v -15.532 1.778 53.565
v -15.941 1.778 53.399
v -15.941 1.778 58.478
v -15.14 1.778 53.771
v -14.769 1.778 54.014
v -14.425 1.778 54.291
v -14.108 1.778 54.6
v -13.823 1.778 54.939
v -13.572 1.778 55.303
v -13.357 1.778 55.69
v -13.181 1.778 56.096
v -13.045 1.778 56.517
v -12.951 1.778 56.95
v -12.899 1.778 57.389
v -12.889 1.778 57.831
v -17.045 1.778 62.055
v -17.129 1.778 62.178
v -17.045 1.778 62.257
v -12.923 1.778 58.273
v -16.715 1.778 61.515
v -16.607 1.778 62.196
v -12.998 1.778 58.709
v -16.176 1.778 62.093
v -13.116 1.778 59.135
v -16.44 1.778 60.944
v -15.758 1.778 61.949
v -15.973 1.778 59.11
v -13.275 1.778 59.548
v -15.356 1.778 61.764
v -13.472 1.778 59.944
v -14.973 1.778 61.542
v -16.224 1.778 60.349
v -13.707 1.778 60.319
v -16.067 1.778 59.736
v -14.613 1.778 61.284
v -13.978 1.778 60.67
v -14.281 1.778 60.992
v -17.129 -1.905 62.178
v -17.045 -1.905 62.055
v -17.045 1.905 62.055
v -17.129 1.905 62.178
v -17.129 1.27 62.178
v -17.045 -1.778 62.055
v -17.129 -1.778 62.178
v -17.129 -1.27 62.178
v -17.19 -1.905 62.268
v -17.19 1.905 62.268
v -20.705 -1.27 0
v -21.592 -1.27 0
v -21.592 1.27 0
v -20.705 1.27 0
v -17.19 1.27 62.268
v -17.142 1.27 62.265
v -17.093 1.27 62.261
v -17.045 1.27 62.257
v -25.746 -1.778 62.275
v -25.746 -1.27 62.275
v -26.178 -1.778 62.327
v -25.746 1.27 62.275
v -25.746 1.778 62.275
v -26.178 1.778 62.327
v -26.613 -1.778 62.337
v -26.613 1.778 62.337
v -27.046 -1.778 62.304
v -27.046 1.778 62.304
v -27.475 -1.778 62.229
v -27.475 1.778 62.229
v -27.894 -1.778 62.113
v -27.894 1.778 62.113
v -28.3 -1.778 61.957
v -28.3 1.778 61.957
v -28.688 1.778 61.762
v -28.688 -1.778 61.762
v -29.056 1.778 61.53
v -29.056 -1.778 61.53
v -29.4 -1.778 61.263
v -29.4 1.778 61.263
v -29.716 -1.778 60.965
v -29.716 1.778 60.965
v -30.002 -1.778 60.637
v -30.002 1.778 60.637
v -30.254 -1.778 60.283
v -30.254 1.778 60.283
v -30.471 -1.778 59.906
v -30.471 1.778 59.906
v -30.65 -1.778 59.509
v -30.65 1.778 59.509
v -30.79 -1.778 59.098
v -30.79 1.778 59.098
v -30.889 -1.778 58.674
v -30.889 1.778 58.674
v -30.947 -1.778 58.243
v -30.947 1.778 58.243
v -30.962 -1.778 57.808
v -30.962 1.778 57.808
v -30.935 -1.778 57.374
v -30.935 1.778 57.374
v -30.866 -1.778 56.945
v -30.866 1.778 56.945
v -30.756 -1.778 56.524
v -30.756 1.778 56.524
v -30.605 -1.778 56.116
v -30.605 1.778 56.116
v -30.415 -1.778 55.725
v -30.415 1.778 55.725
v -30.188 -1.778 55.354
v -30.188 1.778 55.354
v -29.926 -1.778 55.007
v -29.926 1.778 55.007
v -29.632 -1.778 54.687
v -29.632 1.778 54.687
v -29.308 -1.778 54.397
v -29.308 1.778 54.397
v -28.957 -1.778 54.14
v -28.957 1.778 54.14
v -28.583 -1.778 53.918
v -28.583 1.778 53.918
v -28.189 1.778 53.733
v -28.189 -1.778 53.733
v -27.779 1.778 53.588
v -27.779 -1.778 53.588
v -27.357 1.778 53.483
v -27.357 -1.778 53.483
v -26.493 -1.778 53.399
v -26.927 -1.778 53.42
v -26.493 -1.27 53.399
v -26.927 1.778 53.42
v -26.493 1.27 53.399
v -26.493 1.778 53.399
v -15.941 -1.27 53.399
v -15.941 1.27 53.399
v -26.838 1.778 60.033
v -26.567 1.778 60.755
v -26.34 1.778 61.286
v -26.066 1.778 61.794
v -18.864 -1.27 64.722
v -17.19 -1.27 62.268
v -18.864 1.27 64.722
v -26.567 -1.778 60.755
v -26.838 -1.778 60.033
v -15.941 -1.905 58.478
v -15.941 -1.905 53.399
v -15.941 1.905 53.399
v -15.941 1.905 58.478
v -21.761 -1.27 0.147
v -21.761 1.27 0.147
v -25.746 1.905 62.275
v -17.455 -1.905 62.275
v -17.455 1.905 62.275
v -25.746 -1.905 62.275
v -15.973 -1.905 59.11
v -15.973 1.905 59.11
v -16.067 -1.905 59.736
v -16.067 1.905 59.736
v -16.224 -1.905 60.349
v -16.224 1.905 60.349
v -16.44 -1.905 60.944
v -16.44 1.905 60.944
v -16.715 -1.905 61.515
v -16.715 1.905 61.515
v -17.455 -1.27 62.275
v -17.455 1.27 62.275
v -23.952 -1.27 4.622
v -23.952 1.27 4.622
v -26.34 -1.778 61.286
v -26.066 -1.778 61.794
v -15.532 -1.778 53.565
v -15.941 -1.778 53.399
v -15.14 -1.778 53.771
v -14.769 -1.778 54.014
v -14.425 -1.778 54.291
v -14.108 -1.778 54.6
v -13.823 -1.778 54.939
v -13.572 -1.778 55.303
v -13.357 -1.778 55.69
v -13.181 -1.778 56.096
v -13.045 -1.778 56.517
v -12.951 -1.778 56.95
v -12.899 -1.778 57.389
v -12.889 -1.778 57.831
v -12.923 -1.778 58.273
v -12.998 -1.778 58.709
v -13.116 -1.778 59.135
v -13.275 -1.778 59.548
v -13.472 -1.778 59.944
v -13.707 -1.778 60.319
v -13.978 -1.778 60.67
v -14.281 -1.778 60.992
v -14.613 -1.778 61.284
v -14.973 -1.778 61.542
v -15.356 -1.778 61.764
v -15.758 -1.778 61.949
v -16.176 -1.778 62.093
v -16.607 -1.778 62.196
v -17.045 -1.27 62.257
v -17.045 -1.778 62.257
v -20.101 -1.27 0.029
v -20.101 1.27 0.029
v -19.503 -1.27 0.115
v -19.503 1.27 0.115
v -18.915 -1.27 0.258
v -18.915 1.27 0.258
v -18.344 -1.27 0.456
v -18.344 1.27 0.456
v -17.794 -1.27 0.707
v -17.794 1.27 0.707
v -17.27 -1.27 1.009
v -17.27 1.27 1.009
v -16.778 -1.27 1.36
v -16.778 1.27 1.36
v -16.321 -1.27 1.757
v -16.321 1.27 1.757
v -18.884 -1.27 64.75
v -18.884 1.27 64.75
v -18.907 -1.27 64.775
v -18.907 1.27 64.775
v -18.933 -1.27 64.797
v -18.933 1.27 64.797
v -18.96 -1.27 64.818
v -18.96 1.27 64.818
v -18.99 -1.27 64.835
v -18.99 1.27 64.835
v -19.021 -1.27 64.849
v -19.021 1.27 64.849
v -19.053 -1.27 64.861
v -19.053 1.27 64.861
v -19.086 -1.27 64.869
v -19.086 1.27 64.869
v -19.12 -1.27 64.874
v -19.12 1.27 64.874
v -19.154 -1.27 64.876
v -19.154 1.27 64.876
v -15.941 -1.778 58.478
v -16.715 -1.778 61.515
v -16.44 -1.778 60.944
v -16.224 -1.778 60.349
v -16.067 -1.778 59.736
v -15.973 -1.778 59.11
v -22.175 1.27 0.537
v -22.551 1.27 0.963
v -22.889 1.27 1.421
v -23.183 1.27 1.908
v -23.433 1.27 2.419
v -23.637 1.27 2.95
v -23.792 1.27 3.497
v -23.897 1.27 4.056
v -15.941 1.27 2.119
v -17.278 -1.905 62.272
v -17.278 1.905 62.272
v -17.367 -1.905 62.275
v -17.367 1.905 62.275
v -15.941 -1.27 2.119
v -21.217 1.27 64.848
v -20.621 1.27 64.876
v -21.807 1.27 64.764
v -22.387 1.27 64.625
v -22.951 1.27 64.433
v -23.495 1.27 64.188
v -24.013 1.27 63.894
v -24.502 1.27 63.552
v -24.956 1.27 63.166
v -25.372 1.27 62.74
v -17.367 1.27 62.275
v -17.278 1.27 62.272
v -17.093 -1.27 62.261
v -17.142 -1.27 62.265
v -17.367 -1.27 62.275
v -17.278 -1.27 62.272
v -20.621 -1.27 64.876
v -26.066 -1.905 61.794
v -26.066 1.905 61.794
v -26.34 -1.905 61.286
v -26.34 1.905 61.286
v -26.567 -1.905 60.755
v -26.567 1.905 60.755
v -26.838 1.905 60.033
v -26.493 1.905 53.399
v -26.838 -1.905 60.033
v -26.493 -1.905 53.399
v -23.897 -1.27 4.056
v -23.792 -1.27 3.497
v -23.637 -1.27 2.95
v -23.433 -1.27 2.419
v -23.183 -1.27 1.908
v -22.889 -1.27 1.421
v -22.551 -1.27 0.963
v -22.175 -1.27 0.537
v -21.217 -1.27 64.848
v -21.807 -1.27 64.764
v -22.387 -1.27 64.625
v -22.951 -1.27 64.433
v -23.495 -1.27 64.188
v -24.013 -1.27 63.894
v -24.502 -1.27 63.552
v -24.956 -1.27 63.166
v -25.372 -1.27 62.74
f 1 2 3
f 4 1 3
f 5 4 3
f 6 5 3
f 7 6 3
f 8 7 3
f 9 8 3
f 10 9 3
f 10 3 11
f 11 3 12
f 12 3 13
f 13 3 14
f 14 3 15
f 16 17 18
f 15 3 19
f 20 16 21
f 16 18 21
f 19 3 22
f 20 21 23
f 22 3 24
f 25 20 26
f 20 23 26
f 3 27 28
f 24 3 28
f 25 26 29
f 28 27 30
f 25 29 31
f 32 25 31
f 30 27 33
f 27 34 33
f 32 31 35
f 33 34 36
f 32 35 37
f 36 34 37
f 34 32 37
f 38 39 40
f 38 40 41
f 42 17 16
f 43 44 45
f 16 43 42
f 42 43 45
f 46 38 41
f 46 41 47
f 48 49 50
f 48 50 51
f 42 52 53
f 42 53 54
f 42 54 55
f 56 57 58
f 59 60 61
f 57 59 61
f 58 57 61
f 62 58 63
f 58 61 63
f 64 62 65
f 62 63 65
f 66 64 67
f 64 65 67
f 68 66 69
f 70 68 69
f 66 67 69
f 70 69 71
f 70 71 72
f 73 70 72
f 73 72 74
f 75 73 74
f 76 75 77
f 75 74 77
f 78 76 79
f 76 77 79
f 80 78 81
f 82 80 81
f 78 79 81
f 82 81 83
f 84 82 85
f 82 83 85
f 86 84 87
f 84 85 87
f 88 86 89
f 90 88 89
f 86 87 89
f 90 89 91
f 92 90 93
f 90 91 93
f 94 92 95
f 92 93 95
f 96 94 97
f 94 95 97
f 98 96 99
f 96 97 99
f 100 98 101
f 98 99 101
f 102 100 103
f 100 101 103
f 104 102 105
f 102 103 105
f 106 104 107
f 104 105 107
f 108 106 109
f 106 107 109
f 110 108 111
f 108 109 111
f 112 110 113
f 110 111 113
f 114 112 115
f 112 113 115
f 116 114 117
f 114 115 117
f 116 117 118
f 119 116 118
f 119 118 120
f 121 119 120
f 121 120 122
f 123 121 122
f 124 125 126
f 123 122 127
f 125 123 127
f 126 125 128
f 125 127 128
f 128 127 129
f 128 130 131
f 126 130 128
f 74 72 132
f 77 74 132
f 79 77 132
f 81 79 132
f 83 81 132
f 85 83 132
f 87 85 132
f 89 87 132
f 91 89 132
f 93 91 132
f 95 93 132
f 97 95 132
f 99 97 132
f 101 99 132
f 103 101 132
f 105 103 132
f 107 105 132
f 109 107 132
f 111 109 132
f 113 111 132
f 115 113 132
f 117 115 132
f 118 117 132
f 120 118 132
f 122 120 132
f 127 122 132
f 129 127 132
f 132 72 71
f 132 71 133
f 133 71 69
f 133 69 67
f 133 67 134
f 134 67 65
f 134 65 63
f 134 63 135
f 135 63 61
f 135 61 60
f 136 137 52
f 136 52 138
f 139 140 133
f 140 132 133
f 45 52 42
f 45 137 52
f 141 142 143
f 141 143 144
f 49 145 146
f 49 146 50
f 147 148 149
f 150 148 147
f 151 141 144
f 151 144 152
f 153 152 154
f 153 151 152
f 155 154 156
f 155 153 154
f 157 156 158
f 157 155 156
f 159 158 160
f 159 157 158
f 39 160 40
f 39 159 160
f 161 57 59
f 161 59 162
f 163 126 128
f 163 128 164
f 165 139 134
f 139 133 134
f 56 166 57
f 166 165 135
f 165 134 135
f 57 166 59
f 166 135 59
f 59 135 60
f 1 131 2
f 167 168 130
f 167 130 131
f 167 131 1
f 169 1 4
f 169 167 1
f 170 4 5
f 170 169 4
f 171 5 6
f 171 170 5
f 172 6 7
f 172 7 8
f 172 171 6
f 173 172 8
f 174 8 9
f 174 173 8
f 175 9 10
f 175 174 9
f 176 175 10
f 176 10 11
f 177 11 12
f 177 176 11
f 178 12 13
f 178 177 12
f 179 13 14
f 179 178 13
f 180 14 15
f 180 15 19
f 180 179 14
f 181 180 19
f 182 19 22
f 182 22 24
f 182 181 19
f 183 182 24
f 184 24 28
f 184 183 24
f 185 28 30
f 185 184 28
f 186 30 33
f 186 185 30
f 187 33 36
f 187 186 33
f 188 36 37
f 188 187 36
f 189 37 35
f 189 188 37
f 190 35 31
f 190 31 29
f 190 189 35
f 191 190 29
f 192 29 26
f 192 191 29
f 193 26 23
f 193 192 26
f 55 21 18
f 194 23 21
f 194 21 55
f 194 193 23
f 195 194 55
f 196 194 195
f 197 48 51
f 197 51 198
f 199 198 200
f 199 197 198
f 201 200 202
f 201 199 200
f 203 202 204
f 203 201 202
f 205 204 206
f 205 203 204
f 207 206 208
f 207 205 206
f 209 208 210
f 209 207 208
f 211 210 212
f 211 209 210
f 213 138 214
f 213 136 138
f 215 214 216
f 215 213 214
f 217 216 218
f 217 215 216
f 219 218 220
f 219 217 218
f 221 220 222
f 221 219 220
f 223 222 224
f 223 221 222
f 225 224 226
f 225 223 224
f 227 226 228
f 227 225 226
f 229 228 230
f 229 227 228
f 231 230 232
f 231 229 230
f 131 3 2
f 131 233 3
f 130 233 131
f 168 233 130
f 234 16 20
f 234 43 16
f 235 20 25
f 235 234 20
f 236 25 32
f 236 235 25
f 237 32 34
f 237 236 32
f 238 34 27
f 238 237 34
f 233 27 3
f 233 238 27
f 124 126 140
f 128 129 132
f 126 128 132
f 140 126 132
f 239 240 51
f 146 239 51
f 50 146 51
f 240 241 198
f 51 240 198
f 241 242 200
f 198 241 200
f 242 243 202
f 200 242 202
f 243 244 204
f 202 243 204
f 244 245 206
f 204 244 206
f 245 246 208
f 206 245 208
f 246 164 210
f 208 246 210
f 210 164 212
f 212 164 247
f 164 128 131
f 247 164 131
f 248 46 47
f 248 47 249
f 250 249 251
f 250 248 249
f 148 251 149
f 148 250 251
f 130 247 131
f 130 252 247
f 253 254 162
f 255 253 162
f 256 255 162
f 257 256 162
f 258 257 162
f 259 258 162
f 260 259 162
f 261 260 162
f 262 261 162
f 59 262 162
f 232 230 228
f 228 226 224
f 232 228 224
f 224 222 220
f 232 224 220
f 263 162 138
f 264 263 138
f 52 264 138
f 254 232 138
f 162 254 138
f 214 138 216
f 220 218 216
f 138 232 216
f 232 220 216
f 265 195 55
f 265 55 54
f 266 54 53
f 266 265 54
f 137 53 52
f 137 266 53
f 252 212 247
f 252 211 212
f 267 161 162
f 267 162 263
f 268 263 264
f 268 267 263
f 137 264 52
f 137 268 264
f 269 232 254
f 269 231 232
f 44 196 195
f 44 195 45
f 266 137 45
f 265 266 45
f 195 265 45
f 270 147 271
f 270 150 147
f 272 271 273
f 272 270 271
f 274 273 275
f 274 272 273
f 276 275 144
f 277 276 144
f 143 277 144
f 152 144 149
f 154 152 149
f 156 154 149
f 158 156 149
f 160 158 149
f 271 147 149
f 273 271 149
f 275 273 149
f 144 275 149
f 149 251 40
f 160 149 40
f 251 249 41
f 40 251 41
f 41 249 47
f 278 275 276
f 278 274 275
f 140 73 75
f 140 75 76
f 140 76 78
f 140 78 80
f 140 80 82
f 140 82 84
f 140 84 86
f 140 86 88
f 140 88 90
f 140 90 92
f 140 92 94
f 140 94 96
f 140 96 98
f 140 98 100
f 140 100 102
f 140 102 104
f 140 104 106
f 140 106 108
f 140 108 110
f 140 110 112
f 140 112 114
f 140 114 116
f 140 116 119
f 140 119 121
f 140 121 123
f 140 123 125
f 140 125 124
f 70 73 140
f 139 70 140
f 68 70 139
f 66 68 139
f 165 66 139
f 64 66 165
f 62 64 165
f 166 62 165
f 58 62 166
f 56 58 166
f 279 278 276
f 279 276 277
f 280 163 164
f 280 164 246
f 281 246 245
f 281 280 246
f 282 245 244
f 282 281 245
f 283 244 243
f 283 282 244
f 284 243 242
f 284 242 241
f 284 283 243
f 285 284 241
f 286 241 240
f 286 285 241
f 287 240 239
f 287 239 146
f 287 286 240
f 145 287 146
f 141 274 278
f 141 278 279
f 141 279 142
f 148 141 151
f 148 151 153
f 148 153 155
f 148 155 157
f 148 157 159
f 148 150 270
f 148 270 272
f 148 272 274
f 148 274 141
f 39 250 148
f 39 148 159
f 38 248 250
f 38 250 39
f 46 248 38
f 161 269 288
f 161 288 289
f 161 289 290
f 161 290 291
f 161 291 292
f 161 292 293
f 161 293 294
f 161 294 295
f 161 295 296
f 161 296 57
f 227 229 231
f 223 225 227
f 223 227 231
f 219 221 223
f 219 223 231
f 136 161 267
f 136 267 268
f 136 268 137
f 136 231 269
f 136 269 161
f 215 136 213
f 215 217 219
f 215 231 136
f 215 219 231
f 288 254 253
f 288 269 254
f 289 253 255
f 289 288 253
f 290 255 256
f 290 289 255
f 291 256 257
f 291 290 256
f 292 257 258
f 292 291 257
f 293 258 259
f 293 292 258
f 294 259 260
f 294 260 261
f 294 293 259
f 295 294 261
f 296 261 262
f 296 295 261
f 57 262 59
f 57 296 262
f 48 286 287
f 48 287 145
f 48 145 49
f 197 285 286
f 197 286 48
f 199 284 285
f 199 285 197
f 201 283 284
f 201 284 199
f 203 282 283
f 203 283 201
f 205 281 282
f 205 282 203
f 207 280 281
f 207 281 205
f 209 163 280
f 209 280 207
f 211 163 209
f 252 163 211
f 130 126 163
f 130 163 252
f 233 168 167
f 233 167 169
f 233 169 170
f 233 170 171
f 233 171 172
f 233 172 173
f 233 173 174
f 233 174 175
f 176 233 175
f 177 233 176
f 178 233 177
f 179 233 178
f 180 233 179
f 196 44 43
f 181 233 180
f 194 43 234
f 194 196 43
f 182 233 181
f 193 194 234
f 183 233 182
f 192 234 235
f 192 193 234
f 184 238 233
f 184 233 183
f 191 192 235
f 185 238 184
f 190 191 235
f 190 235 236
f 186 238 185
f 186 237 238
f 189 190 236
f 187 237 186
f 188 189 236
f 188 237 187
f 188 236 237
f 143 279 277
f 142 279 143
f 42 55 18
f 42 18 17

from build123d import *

# Parameters (mm, degrees)
F1_DEPTH = 1.27
F2_DEPTH = 1.778
F3_DEPTH = 1.905


with BuildPart() as f1:
    # F0 (on Front) → F1 (new body, symmetric)
    with BuildSketch(Plane.XZ):
        with BuildLine():
            Line((-17.1290759672, 62.1781415984), (-17.0449191323, 62.2570482765))
            ThreePointArc((-17.0449191323, 62.2570482765), (-17.1175233509, 62.2630083848), (-17.1902133933, 62.2678097582))
            Line((-17.1902133933, 62.2678097582), (-17.1290759672, 62.1781415984))
        make_face()
    extrude(amount=F1_DEPTH, both=True)



with BuildPart() as f1b:
    # F0 (on Front) → F1, piece 2 (new body, symmetric)
    with BuildSketch(Plane.XZ):
        with BuildLine():
            Line((-15.9414615482, 53.3987285048), (-26.4926385512, 53.3987285048))
            Line((-26.4926385512, 53.3987285048), (-23.9521881142, 4.6220757771))
            ThreePointArc((-23.9521881142, 4.6220757771), (-23.3140778798, 2.1604167523), (-21.7612694137, 0.1465310323))
            Line((-21.7612694137, 0.1465310323), (-21.5916018933, 0))
            Line((-21.5916018933, 0), (-20.7053358443, 0))
            ThreePointArc((-20.7053358443, 0), (-18.3436644921, 0.4555103339), (-16.3208169843, 1.7566902602))
            Line((-16.3208169843, 1.7566902602), (-15.9414615482, 2.1188019309))
            Line((-15.9414615482, 2.1188019309), (-15.9414615482, 53.3987285048))
        make_face()
    extrude(amount=F1_DEPTH, both=True)


with BuildPart() as f1c:
    # F0 (on Front) → F1, piece 3 (new body, symmetric)
    with BuildSketch(Plane.XZ):
        with BuildLine():
            ThreePointArc((-20.6214907347, 64.8756995797), (-23.4947607709, 64.1884567968), (-25.7460988084, 62.2754851857))
            Line((-25.7460988084, 62.2754851857), (-17.4548914656, 62.2754851857))
            ThreePointArc((-17.4548914656, 62.2754851857), (-17.322496796, 62.2735659256), (-17.1902133933, 62.2678097582))
            Line((-17.1902133933, 62.2678097582), (-18.8636997039, 64.722254562))
            ThreePointArc((-18.8636997039, 64.722254562), (-18.989842312, 64.834978978), (-19.1540390967, 64.8756995797))
            Line((-19.1540390967, 64.8756995797), (-20.6214907347, 64.8756995797))
        make_face()
    extrude(amount=F1_DEPTH, both=True)


with BuildPart() as f1_1:
    add(f1.part)

    add(f1b.part)  # F2 merges F1b

    add(f1c.part)  # F2 merges F1c
    # F0 (on Front) → F2 (join, symmetric)
    with BuildSketch(Plane.XZ):
        with BuildLine():
            Line((-26.4926385512, 53.3987285048), (-26.8381591886, 60.0327253342))
            Line((-26.8381591886, 60.0327253342), (-26.5671806364, 60.7553344362))
            ThreePointArc((-26.5671806364, 60.7553344362), (-26.2085820076, 61.5434654933), (-25.7460988084, 62.2754851857))
            ThreePointArc((-25.7460988084, 62.2754851857), (-30.946685328, 58.2430866257), (-26.4926385512, 53.3987285048))
        make_face()
        with BuildLine():
            Line((-15.9414615482, 58.4775210511), (-15.9414615482, 53.3987285048))
            ThreePointArc((-15.9414615482, 53.3987285048), (-12.9225271434, 58.2726765092), (-17.0449191323, 62.2570482765))
            Line((-17.0449191323, 62.2570482765), (-17.1290759672, 62.1781415984))
            Line((-17.1290759672, 62.1781415984), (-17.0449191323, 62.0547116635))
            ThreePointArc((-17.0449191323, 62.0547116635), (-16.2235935395, 60.3492790027), (-15.9414615482, 58.4775210511))
        make_face()
    extrude(amount=F2_DEPTH, both=True)


with BuildPart() as f3:
    # F0 (on Front) → F3 (new body, symmetric)
    with BuildSketch(Plane.XZ):
        with BuildLine():
            Line((-26.5671806364, 60.7553344362), (-26.8381591886, 60.0327253342))
            Line((-26.8381591886, 60.0327253342), (-26.4926385512, 53.3987285048))
            Line((-26.4926385512, 53.3987285048), (-21.3093711658, 58.2586357401))
            Line((-21.3093711658, 58.2586357401), (-25.7460988084, 62.2754851857))
            ThreePointArc((-25.7460988084, 62.2754851857), (-26.2085820076, 61.5434654933), (-26.5671806364, 60.7553344362))
        make_face()
        with BuildLine():
            Line((-17.4548914656, 62.2754851857), (-25.7460988084, 62.2754851857))
            Line((-25.7460988084, 62.2754851857), (-21.3093711658, 58.2586357401))
            Line((-21.3093711658, 58.2586357401), (-17.1290759672, 62.1781415984))
            Line((-17.1290759672, 62.1781415984), (-17.1902133933, 62.2678097582))
            ThreePointArc((-17.1902133933, 62.2678097582), (-17.322496796, 62.2735659256), (-17.4548914656, 62.2754851857))
        make_face()
        Polygon((-21.3093711658, 58.2586357401), (-26.4926385512, 53.3987285048), (-15.9414615482, 53.3987285048), align=None)
        with BuildLine():
            Line((-21.3093711658, 58.2586357401), (-15.9414615482, 53.3987285048))
            Line((-15.9414615482, 53.3987285048), (-15.9414615482, 58.4775210511))
            ThreePointArc((-15.9414615482, 58.4775210511), (-16.2235935395, 60.3492790027), (-17.0449191323, 62.0547116635))
            Line((-17.0449191323, 62.0547116635), (-17.1290759672, 62.1781415984))
            Line((-17.1290759672, 62.1781415984), (-21.3093711658, 58.2586357401))
        make_face()
    extrude(amount=F3_DEPTH, both=True)


solid = Compound([f1_1.part, f3.part])
